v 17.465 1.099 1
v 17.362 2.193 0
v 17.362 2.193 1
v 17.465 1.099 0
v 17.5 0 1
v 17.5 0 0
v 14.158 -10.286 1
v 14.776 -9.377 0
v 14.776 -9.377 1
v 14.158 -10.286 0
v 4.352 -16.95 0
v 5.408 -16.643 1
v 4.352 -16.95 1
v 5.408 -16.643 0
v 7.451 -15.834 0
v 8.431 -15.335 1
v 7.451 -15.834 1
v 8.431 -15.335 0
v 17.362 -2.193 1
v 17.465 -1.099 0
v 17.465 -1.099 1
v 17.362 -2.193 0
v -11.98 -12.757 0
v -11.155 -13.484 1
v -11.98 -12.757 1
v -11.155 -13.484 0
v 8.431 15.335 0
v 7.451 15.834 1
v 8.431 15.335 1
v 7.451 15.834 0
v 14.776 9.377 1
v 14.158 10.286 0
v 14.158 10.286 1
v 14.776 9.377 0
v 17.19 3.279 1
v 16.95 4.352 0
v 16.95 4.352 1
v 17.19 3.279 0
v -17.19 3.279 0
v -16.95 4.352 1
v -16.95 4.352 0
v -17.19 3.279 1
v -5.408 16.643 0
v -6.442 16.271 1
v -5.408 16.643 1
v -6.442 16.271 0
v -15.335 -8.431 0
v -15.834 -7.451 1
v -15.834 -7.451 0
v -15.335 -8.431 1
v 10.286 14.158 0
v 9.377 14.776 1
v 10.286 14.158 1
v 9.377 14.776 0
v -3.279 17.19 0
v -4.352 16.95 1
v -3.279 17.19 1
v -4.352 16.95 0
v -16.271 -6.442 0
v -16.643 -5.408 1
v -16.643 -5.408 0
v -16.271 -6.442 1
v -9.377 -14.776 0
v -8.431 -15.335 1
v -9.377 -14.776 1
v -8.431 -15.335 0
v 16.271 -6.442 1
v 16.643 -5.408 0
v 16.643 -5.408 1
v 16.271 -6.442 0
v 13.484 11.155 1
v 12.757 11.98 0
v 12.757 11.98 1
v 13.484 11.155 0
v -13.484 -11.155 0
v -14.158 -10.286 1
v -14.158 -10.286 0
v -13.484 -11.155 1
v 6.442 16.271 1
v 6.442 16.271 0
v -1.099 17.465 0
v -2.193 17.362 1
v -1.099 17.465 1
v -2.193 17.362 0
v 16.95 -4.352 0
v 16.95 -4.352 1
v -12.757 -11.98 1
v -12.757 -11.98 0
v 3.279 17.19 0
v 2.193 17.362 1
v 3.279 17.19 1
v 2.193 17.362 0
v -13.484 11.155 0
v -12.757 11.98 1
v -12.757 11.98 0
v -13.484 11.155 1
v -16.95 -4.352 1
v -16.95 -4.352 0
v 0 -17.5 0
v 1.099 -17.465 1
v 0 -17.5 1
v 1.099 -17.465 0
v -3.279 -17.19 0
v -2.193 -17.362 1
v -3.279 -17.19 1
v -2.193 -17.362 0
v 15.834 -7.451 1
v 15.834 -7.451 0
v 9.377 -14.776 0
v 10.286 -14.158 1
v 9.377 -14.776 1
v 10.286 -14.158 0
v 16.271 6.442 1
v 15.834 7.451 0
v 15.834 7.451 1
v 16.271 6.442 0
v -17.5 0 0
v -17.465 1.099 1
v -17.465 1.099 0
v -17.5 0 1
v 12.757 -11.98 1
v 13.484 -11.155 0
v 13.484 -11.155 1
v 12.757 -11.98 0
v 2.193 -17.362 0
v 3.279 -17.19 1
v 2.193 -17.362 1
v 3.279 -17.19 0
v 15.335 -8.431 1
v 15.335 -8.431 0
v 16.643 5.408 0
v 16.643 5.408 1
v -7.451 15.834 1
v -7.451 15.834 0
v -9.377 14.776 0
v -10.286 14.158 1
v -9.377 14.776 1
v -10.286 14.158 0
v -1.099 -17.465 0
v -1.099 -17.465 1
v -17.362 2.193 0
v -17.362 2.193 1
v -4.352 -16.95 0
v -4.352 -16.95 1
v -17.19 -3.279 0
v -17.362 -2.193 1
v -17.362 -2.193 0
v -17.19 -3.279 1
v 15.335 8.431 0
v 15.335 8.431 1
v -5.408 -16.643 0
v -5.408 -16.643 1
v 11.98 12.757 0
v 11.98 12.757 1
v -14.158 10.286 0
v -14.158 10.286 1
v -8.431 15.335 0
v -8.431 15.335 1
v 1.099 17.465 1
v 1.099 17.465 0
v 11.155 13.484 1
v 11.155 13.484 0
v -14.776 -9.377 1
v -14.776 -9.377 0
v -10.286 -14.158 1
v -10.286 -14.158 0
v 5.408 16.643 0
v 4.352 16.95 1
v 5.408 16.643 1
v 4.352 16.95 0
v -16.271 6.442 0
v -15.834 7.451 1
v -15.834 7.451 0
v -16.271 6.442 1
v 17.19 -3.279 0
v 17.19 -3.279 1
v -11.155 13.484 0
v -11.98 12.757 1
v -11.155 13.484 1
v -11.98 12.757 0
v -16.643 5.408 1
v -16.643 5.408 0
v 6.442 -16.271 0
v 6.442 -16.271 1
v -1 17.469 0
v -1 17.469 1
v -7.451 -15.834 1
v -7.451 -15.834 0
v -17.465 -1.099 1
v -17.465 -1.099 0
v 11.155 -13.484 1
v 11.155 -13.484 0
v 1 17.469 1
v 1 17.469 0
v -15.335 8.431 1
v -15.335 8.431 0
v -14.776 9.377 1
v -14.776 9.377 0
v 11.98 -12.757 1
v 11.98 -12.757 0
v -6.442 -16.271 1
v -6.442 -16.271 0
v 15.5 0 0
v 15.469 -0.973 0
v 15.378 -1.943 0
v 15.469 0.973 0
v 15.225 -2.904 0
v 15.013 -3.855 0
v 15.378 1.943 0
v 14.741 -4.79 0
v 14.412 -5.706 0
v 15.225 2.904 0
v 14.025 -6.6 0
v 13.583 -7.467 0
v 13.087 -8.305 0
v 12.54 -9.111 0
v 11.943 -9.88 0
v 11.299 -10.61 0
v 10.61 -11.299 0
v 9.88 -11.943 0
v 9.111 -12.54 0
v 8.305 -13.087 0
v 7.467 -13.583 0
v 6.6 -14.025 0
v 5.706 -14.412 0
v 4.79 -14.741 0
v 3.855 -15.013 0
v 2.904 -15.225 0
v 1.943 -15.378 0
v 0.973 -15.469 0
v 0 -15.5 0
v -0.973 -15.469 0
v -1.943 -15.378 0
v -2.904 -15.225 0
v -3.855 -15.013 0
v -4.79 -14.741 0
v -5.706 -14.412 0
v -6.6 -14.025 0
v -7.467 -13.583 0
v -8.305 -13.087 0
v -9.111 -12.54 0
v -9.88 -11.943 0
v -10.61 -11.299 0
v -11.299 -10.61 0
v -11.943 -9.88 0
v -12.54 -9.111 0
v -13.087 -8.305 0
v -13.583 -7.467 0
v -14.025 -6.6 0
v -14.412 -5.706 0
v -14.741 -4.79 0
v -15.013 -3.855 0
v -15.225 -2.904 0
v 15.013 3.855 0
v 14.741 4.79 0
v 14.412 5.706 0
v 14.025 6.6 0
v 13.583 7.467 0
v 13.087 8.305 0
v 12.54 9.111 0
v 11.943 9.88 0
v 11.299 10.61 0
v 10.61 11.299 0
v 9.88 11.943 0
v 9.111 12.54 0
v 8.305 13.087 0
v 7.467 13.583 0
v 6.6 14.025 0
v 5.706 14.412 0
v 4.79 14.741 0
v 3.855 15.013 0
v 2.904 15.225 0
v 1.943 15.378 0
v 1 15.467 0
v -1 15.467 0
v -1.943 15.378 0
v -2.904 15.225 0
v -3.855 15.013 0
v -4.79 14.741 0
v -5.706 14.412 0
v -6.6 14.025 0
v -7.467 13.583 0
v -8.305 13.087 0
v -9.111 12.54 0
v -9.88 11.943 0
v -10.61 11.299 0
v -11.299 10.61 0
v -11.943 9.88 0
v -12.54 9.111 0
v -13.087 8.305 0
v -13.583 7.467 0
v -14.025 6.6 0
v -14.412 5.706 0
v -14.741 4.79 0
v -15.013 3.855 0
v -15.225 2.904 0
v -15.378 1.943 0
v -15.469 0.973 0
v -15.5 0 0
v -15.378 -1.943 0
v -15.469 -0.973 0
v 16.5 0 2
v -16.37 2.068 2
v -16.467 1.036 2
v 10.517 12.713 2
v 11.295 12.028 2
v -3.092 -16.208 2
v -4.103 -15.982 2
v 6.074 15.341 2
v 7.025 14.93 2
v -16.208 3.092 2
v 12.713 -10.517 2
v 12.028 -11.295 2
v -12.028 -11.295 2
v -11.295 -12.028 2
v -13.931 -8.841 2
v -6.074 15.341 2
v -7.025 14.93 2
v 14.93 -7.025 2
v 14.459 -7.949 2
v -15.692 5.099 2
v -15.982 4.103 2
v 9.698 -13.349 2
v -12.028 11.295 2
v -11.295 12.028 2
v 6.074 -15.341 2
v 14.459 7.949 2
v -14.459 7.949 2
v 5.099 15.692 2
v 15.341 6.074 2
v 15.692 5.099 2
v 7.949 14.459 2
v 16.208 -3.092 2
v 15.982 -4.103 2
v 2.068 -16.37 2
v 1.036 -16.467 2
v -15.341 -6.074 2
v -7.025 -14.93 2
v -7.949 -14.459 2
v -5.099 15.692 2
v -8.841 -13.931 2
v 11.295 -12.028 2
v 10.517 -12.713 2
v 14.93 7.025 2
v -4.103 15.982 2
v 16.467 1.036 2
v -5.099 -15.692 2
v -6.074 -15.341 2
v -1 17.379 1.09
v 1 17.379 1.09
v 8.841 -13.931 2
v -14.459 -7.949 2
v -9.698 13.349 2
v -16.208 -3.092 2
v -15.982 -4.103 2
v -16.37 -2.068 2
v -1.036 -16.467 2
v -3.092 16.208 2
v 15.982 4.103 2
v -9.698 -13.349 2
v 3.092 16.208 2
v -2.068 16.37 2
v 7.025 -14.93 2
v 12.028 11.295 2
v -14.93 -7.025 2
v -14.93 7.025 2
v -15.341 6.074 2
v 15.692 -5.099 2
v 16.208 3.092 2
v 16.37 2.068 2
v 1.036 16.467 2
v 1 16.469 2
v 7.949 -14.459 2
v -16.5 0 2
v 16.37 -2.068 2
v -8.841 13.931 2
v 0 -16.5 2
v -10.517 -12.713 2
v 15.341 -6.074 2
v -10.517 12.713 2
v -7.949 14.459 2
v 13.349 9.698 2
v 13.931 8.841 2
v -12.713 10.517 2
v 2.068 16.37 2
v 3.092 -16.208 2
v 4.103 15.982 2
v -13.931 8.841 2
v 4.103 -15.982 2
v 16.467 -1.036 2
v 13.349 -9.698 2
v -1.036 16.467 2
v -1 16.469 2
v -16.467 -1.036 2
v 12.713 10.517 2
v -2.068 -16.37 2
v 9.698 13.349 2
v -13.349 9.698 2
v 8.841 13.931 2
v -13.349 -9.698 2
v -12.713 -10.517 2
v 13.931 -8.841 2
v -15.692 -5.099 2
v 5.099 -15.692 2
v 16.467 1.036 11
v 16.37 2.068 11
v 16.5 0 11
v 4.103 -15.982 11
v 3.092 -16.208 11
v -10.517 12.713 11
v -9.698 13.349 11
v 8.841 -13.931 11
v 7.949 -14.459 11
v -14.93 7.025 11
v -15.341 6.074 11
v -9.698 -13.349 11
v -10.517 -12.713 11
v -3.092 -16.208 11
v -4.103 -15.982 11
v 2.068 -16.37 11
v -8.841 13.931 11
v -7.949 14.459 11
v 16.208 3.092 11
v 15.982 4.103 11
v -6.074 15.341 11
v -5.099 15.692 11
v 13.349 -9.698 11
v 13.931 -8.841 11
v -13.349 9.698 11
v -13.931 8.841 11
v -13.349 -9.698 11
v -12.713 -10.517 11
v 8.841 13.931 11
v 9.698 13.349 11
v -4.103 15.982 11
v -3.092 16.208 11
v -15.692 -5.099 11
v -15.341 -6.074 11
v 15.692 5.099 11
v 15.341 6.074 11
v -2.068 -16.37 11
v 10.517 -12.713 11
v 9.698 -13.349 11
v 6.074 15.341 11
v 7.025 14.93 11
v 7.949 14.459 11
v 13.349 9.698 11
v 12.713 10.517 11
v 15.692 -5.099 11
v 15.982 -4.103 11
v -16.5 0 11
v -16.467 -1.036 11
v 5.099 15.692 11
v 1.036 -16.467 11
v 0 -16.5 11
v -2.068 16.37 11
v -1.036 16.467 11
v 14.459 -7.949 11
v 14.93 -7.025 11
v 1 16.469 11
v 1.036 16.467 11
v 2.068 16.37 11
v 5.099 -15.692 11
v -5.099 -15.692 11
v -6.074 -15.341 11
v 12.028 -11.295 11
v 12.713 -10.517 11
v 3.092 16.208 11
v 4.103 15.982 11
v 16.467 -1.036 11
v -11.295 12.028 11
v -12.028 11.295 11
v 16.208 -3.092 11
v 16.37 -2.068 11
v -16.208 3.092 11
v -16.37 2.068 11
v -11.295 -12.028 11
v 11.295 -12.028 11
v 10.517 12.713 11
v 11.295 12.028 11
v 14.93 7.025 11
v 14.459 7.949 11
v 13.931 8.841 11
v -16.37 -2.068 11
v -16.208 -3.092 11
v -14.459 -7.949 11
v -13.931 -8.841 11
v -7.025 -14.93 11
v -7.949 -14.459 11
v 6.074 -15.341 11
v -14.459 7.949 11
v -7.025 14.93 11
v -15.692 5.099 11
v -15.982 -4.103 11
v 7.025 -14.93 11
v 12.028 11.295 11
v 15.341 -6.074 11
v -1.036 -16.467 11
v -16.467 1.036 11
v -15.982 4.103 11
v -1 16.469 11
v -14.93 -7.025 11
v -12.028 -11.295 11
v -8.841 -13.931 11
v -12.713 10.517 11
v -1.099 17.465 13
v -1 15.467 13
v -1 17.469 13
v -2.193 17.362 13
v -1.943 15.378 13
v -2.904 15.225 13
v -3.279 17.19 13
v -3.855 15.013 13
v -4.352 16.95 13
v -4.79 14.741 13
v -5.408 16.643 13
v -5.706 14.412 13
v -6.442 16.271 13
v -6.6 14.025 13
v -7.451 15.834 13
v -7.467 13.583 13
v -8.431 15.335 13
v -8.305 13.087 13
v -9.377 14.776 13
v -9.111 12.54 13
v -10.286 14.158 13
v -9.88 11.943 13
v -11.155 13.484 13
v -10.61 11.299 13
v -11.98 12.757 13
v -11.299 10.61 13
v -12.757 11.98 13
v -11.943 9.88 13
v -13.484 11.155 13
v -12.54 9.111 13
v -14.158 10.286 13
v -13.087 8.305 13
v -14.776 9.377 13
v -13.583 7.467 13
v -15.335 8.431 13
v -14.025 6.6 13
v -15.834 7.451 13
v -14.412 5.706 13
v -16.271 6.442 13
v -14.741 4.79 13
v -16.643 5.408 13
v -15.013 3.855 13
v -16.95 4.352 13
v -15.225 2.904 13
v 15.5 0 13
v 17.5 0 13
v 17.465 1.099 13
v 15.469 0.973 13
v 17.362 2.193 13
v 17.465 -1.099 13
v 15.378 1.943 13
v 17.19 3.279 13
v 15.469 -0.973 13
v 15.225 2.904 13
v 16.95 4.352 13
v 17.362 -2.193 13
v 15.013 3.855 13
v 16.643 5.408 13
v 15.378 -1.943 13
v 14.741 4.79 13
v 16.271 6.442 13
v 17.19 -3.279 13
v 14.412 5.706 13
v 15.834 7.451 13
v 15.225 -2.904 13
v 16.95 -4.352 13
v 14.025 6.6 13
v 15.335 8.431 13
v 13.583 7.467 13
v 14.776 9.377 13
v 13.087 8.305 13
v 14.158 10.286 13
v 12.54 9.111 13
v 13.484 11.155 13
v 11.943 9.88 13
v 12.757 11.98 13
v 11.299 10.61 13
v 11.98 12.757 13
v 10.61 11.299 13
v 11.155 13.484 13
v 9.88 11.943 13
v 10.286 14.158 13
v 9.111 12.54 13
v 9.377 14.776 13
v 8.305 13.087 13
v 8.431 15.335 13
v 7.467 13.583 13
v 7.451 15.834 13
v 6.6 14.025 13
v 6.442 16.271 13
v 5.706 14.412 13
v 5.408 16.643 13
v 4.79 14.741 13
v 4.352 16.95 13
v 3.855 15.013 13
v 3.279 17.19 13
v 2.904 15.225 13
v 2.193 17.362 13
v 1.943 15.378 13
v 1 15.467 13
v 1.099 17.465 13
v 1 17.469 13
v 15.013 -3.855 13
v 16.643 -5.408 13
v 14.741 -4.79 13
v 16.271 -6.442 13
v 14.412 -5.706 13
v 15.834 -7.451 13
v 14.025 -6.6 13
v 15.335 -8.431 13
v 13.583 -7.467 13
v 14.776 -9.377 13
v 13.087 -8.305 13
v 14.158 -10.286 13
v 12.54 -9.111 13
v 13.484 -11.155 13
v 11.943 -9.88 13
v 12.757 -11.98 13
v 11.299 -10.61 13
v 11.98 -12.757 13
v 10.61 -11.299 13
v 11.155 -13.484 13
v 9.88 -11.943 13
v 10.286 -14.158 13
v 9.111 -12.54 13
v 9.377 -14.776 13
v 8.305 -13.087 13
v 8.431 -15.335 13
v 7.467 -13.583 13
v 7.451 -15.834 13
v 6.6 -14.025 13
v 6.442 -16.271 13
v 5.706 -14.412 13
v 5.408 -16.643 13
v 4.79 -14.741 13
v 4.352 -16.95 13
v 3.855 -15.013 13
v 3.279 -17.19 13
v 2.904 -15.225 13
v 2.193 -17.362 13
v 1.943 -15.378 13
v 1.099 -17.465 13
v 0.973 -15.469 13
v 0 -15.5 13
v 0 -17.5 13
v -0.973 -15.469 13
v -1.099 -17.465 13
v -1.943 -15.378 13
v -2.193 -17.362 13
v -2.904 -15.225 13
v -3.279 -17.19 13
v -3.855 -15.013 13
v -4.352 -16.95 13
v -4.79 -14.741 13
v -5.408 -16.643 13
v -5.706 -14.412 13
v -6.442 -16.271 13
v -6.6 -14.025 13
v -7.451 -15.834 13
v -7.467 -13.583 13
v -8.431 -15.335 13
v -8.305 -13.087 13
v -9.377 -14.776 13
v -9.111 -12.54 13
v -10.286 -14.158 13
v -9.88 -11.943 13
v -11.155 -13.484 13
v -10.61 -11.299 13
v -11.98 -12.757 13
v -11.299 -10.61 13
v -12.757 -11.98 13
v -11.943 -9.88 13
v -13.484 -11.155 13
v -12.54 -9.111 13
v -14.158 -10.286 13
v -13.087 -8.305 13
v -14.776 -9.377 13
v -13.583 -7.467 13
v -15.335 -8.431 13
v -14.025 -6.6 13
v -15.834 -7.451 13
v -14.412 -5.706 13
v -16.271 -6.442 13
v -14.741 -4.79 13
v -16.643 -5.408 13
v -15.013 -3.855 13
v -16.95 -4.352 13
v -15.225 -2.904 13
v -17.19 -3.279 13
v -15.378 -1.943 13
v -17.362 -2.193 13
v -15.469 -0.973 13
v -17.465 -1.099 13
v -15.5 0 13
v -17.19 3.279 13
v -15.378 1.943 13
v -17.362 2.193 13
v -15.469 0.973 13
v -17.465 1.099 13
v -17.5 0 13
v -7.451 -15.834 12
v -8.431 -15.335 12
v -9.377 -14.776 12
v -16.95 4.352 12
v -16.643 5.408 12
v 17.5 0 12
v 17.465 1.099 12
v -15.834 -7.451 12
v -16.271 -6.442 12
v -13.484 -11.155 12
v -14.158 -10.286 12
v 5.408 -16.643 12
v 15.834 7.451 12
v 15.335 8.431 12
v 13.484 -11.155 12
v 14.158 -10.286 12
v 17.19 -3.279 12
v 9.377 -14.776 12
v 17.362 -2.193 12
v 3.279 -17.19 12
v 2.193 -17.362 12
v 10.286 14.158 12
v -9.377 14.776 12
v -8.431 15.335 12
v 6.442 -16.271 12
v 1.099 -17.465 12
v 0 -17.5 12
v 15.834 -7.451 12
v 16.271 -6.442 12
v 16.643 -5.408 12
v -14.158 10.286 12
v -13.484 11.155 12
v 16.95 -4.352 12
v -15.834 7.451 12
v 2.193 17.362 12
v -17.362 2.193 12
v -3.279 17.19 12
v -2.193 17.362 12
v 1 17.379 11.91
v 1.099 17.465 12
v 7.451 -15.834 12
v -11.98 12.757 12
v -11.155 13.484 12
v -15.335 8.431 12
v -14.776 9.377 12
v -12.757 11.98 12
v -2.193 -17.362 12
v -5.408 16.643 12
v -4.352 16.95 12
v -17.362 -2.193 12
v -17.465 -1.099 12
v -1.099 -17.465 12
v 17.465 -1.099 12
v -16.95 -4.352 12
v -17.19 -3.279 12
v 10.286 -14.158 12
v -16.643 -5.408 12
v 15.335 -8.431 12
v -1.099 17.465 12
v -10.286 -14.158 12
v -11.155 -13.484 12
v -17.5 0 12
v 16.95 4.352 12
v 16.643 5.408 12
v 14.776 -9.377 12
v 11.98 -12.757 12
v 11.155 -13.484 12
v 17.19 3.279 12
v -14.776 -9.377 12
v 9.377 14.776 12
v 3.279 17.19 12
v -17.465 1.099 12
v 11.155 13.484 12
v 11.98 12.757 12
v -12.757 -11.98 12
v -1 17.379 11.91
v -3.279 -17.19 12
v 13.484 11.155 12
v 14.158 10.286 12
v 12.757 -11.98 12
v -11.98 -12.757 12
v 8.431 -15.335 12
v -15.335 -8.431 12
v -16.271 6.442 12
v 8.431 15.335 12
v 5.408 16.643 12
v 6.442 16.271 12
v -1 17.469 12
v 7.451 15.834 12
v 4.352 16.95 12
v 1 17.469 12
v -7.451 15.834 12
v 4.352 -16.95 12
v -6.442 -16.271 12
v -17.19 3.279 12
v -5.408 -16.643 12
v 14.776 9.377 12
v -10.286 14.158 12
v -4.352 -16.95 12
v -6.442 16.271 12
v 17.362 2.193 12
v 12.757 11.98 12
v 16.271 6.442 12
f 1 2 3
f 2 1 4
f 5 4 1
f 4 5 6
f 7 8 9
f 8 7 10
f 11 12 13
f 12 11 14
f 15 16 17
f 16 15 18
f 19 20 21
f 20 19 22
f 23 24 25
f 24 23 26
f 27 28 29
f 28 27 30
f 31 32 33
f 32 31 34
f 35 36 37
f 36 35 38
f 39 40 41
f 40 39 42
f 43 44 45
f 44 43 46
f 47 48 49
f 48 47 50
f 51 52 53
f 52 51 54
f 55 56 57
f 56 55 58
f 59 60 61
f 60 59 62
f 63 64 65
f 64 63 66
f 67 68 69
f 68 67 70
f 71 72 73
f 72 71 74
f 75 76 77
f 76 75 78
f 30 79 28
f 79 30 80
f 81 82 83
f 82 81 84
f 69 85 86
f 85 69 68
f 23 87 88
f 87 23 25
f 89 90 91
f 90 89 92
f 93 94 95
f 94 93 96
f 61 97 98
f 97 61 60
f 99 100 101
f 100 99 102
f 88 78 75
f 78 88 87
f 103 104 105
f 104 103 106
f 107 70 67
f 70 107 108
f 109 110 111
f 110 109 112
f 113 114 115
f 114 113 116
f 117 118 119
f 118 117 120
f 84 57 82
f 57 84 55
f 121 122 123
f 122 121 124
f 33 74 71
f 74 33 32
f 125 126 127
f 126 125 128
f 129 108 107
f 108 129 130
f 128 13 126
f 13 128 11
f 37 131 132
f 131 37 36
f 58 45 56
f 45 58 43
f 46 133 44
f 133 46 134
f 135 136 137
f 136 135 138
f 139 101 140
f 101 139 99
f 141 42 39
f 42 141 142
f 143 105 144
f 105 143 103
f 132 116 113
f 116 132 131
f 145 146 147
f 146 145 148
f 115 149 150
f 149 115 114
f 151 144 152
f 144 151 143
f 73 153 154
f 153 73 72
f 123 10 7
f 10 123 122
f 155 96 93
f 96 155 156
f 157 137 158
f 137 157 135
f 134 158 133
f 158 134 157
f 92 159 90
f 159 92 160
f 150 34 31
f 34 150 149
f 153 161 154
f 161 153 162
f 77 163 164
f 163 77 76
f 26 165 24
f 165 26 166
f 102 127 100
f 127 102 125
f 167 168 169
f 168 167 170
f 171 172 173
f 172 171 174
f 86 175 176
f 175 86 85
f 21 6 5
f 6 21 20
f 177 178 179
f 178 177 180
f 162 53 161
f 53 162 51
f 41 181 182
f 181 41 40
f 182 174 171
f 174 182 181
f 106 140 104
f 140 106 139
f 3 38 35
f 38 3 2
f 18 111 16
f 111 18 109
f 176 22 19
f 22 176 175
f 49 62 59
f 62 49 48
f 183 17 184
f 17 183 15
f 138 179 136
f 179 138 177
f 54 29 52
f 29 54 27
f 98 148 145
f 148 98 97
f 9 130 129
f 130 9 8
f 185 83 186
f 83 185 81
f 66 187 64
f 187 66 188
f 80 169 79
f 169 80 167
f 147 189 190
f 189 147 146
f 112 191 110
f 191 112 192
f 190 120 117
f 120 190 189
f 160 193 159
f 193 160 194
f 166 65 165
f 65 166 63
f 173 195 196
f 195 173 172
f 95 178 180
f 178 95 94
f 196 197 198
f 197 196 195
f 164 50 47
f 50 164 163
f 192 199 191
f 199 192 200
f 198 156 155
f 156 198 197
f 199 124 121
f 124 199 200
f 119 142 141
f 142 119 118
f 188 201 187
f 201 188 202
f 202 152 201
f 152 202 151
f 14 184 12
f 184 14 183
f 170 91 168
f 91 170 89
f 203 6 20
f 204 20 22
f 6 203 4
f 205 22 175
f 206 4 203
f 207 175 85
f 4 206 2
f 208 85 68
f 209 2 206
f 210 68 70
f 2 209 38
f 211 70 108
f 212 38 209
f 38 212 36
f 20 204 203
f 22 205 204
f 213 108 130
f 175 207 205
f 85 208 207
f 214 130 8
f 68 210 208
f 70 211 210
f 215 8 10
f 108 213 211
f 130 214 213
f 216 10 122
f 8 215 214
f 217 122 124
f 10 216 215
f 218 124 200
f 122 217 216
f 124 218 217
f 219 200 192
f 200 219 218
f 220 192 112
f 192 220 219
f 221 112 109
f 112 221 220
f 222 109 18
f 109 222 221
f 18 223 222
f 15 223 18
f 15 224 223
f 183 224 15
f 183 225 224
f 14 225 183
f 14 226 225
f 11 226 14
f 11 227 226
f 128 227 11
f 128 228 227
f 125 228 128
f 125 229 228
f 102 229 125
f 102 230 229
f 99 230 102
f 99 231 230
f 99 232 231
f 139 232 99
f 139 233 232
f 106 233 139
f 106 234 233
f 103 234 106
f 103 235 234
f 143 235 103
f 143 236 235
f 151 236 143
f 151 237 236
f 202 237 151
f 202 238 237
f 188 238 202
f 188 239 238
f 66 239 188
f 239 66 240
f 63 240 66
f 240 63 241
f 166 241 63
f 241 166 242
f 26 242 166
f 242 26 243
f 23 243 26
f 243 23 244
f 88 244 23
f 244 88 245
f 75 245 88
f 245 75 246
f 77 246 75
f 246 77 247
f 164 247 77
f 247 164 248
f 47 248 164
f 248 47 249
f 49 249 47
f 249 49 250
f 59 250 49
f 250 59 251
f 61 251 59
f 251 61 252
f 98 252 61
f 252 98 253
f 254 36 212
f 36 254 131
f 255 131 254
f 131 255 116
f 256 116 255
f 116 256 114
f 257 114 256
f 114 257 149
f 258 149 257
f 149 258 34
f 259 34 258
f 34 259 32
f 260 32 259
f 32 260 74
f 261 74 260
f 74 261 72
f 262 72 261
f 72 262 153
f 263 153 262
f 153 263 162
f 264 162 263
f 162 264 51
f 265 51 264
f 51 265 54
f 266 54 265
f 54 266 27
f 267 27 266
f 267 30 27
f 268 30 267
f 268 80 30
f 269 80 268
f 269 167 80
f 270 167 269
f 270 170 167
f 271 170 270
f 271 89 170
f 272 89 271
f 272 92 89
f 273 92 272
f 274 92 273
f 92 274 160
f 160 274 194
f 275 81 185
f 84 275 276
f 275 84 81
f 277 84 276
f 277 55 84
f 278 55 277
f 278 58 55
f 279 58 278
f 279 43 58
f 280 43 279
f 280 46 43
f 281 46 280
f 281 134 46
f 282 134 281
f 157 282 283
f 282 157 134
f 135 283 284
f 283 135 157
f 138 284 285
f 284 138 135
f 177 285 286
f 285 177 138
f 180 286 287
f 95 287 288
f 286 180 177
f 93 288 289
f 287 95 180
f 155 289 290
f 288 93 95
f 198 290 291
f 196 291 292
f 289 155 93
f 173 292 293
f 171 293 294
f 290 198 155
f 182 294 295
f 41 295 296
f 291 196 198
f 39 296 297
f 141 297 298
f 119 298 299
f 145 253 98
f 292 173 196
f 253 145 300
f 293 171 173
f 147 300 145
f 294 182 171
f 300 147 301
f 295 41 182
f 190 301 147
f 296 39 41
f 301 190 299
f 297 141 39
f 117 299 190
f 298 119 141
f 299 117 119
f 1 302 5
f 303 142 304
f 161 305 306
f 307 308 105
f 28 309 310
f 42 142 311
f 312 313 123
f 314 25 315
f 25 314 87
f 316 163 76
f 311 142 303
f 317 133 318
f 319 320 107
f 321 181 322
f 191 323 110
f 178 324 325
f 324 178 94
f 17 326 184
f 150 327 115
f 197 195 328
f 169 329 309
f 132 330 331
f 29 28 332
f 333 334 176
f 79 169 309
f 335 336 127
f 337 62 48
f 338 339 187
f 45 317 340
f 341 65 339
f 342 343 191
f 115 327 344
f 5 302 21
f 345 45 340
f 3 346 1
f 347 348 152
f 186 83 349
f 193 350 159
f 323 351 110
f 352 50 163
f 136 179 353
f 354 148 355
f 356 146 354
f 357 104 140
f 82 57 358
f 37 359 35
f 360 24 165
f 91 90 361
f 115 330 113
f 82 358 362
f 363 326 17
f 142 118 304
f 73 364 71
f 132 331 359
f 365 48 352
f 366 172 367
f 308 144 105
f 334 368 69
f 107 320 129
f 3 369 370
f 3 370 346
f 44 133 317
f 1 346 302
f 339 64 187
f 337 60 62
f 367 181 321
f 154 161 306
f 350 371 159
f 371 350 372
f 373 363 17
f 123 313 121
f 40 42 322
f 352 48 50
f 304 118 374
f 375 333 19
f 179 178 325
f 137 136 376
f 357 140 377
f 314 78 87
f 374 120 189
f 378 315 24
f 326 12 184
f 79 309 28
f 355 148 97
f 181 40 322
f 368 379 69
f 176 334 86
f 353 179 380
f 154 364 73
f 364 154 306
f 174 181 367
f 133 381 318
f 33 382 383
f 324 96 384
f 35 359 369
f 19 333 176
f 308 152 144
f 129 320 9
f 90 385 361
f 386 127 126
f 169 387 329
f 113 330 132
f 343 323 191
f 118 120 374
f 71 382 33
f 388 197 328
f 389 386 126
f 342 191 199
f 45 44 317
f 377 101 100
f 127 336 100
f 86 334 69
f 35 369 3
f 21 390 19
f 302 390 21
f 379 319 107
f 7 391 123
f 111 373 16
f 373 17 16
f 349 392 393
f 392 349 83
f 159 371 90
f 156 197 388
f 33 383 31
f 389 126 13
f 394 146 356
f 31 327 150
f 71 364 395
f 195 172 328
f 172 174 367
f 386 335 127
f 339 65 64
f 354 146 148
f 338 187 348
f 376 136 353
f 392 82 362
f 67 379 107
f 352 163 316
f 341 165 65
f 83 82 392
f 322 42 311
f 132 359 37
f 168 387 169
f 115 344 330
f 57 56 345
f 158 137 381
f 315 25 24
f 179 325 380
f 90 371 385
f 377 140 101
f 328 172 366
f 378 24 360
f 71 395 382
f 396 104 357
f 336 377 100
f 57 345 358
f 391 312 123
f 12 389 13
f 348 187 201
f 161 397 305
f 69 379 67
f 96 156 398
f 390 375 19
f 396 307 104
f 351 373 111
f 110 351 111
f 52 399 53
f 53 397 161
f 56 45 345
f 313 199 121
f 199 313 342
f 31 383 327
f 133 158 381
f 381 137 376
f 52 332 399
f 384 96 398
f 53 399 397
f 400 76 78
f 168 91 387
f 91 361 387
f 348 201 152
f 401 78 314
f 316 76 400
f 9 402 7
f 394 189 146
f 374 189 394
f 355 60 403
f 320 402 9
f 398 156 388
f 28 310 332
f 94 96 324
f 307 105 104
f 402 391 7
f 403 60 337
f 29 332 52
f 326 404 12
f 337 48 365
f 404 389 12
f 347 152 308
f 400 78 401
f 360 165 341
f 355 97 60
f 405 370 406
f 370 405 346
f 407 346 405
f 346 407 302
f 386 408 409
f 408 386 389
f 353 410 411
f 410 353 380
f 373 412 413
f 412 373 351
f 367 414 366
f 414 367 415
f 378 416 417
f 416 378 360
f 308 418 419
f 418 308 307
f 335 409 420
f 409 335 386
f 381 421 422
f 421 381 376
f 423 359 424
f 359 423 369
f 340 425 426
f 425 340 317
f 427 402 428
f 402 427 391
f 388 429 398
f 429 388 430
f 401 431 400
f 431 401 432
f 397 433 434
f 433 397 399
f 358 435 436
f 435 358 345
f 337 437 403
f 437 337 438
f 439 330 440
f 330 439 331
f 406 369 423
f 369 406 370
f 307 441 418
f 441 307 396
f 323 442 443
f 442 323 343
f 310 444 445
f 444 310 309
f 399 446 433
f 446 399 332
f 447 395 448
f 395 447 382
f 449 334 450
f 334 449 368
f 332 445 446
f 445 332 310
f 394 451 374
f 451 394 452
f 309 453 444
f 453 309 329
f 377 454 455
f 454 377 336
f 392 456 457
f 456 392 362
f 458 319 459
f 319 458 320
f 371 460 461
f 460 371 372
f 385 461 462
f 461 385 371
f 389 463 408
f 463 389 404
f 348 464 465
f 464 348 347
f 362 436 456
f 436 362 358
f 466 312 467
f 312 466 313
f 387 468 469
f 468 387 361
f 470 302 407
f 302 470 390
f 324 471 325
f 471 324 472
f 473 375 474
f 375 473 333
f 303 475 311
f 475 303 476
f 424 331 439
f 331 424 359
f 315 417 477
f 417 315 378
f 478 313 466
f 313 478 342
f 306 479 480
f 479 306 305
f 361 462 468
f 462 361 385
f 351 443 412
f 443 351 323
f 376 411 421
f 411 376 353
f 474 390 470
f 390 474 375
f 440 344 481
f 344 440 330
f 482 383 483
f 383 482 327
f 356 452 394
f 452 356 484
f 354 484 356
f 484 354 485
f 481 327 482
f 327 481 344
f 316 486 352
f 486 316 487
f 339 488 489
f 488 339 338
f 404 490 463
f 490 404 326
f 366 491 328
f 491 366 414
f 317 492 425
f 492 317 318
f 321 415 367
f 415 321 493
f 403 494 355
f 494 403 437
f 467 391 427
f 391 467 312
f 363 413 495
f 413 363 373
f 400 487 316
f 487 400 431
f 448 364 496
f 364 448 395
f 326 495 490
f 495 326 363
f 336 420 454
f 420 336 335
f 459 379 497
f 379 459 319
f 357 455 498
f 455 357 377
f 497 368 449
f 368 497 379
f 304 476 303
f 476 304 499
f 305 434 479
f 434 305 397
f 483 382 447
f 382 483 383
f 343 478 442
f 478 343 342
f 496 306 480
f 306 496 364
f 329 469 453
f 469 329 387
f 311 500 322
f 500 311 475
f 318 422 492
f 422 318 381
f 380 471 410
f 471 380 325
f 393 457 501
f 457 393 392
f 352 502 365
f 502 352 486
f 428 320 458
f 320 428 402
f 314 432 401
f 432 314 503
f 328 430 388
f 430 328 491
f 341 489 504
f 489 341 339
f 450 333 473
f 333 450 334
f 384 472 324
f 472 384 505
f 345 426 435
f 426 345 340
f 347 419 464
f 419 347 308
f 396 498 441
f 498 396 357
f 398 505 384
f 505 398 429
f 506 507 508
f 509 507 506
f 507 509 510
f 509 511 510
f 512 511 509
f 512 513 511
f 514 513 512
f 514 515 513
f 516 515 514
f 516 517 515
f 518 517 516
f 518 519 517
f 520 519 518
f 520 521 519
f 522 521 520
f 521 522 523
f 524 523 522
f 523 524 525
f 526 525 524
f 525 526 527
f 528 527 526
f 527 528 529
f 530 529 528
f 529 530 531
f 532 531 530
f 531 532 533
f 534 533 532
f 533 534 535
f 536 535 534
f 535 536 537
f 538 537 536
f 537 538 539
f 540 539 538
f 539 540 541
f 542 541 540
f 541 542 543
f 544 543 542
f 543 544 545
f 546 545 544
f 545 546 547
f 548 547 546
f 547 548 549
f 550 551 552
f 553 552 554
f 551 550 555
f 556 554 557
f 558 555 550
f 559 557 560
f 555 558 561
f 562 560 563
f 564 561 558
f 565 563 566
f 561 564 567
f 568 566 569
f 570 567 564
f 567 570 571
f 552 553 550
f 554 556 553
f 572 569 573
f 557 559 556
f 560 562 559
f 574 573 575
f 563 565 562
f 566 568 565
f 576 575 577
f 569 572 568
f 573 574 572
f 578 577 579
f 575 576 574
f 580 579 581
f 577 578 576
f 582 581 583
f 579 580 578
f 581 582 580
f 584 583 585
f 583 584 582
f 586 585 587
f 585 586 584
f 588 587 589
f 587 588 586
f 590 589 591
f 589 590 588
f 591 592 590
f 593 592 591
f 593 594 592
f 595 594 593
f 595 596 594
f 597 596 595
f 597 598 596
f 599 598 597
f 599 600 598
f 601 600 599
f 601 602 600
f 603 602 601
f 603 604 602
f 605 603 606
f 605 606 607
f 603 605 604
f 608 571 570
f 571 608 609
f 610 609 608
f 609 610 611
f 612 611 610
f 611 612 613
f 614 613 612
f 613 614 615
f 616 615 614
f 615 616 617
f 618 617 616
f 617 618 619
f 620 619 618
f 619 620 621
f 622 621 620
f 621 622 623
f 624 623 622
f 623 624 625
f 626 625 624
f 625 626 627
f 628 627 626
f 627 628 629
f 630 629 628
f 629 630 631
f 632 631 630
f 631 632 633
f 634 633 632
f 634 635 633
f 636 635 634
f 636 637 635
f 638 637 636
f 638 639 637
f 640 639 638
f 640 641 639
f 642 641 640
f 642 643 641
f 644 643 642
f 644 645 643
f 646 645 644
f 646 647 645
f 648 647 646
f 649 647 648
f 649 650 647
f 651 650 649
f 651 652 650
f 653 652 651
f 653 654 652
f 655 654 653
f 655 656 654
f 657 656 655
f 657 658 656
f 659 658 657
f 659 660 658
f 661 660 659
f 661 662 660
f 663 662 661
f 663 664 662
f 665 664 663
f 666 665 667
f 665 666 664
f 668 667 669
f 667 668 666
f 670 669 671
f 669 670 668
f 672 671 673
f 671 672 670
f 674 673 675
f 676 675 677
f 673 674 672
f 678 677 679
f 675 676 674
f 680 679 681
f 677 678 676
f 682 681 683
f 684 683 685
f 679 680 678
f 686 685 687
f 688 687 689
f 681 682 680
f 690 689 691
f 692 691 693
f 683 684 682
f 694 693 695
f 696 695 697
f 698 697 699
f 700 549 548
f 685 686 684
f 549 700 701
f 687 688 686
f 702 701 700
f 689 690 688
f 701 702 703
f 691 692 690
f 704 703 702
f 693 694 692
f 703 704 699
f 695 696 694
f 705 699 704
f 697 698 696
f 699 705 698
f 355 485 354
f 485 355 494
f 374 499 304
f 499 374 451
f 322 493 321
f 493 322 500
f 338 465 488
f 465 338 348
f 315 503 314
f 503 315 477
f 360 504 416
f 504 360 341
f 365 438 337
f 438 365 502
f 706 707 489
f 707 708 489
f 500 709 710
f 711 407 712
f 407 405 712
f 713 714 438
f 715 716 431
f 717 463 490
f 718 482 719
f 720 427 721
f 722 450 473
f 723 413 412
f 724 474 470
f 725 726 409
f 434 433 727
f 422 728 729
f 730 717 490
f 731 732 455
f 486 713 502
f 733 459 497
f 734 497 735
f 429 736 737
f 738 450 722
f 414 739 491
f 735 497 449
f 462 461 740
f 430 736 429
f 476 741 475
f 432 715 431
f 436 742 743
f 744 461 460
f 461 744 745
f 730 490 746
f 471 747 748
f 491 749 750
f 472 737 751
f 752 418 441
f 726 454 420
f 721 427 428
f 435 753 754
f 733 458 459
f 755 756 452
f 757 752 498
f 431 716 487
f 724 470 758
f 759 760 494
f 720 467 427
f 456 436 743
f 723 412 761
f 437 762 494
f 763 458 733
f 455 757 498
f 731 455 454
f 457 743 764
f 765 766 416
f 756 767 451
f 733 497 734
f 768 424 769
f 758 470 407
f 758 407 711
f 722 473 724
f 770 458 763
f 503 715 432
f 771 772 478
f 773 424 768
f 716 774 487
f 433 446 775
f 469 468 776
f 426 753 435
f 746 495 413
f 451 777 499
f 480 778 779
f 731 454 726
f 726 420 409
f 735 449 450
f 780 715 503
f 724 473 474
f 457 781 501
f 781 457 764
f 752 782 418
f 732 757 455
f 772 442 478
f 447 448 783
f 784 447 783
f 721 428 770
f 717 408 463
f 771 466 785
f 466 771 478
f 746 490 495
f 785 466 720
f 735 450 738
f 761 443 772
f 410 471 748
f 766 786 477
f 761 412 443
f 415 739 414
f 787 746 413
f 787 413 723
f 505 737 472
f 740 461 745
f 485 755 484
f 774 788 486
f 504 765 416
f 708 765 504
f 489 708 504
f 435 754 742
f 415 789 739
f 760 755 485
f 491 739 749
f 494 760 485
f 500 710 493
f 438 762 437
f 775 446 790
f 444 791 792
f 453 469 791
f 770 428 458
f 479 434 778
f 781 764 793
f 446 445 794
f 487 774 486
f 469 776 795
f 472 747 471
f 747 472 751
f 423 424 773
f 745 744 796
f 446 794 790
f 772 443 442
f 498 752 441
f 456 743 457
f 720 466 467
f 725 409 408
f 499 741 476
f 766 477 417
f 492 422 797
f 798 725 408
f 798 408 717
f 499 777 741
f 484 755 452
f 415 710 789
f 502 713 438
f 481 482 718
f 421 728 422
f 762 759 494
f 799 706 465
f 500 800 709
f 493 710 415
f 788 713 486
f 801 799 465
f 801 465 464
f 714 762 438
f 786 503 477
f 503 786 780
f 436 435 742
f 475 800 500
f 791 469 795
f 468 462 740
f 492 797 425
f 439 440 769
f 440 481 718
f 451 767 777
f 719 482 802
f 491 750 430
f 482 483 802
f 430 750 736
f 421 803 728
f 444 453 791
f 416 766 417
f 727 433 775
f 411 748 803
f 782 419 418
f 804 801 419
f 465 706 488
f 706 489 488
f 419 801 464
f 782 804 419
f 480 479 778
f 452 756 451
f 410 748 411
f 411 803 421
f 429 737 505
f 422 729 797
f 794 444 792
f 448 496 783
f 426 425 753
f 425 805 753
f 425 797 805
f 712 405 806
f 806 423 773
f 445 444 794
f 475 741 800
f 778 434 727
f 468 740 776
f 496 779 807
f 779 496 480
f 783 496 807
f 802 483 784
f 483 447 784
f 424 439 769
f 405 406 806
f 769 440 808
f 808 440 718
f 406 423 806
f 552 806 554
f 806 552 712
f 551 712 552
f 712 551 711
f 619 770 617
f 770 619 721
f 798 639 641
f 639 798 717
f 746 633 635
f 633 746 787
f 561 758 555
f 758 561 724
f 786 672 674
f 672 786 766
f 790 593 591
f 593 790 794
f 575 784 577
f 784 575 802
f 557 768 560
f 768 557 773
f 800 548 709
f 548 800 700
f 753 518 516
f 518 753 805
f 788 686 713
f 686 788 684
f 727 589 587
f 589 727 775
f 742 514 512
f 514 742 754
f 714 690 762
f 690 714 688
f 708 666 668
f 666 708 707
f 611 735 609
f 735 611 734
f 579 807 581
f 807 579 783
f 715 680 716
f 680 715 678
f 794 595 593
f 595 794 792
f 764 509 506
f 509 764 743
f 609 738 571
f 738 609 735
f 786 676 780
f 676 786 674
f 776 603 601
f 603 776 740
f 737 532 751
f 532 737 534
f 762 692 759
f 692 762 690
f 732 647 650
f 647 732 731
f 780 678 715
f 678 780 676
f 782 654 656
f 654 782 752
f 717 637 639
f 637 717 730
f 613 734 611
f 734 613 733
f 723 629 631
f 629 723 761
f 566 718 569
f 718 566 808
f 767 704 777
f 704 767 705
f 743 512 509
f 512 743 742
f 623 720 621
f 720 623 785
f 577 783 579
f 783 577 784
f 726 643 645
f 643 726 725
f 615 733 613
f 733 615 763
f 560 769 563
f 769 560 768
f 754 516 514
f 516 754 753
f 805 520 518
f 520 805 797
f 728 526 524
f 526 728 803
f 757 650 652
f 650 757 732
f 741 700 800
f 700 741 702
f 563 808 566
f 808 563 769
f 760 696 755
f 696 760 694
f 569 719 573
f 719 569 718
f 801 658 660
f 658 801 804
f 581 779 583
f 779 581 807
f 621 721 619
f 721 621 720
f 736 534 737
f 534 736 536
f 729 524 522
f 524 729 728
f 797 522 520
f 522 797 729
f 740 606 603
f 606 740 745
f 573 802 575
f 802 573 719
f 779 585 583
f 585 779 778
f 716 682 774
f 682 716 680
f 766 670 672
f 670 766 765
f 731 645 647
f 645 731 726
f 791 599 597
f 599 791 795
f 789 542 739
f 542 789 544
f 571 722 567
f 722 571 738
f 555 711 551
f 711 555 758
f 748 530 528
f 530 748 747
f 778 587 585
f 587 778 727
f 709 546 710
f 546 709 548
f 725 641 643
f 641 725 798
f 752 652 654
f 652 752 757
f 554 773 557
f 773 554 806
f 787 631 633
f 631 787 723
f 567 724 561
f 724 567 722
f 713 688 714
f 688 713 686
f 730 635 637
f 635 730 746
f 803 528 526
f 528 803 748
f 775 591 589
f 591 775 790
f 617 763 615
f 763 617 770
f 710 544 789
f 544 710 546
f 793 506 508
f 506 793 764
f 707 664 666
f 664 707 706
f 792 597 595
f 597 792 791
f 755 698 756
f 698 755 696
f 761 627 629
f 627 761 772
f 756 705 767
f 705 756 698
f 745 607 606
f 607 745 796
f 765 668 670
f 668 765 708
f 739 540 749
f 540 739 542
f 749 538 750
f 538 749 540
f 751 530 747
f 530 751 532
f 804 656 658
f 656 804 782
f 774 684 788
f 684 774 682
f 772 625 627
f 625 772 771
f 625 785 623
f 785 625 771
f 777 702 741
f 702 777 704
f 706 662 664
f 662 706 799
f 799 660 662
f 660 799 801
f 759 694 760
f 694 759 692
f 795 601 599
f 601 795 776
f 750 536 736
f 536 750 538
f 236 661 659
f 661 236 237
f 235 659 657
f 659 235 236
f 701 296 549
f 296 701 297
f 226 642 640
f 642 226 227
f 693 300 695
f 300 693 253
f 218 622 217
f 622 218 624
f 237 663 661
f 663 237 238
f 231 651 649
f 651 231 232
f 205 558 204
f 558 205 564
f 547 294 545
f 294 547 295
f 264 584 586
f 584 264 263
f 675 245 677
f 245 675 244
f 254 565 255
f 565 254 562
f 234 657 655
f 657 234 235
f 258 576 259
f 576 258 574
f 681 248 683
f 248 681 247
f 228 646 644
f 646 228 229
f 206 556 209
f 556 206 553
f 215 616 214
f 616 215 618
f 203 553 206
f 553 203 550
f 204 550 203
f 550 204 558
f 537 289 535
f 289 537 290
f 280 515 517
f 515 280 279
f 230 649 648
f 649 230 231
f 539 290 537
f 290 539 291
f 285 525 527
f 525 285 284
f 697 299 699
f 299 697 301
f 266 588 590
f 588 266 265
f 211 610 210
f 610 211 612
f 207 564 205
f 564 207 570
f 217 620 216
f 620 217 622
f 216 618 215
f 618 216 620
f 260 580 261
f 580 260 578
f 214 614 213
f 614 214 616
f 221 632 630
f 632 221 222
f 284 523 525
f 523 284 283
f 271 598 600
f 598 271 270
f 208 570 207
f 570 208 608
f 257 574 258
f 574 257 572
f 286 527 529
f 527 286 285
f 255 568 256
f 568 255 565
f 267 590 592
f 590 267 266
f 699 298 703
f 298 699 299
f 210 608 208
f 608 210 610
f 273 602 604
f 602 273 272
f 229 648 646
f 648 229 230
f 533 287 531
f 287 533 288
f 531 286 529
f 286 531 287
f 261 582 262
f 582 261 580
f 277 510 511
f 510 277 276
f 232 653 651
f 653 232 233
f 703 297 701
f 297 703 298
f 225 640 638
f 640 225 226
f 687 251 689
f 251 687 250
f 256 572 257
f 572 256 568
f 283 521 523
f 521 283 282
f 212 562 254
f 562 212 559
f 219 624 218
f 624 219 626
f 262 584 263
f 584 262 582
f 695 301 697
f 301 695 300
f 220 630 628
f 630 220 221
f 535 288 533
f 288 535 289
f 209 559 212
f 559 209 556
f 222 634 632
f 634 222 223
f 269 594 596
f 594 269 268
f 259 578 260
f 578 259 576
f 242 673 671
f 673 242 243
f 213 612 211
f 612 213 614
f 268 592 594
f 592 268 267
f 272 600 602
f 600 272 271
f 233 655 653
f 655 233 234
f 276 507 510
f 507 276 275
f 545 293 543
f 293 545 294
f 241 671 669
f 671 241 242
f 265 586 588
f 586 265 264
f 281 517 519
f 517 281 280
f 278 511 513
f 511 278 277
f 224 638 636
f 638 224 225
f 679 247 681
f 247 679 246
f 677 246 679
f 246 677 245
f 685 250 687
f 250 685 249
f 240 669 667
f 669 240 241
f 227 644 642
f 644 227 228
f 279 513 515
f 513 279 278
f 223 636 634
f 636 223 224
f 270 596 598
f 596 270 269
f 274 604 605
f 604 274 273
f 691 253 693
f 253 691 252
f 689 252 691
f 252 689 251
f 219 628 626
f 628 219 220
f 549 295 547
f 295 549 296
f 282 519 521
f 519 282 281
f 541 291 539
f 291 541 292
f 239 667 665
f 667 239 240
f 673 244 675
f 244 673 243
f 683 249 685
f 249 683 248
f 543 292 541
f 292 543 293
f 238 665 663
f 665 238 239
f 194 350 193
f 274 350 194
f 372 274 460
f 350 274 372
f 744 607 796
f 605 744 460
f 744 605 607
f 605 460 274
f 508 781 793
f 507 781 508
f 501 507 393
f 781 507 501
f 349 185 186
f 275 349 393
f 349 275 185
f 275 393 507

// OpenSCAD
// print in TPU to go between 33mm clamp and 31.8mm bars.

$fn=100;

difference() {
    union() {
        cylinder(d=35, h=1);
        translate([0,0,1]) cylinder(d1=35,d2=33,h=1);
        cylinder(d=33, h=13);
        translate([0,0,11]) cylinder(d1=33,d2=35,h=1);
        translate([0,0,12]) cylinder(d=35,h=1);
    }
    cylinder(d=31,h=13);
    translate([-1,0,0]) cube([2,50,13]);
}
